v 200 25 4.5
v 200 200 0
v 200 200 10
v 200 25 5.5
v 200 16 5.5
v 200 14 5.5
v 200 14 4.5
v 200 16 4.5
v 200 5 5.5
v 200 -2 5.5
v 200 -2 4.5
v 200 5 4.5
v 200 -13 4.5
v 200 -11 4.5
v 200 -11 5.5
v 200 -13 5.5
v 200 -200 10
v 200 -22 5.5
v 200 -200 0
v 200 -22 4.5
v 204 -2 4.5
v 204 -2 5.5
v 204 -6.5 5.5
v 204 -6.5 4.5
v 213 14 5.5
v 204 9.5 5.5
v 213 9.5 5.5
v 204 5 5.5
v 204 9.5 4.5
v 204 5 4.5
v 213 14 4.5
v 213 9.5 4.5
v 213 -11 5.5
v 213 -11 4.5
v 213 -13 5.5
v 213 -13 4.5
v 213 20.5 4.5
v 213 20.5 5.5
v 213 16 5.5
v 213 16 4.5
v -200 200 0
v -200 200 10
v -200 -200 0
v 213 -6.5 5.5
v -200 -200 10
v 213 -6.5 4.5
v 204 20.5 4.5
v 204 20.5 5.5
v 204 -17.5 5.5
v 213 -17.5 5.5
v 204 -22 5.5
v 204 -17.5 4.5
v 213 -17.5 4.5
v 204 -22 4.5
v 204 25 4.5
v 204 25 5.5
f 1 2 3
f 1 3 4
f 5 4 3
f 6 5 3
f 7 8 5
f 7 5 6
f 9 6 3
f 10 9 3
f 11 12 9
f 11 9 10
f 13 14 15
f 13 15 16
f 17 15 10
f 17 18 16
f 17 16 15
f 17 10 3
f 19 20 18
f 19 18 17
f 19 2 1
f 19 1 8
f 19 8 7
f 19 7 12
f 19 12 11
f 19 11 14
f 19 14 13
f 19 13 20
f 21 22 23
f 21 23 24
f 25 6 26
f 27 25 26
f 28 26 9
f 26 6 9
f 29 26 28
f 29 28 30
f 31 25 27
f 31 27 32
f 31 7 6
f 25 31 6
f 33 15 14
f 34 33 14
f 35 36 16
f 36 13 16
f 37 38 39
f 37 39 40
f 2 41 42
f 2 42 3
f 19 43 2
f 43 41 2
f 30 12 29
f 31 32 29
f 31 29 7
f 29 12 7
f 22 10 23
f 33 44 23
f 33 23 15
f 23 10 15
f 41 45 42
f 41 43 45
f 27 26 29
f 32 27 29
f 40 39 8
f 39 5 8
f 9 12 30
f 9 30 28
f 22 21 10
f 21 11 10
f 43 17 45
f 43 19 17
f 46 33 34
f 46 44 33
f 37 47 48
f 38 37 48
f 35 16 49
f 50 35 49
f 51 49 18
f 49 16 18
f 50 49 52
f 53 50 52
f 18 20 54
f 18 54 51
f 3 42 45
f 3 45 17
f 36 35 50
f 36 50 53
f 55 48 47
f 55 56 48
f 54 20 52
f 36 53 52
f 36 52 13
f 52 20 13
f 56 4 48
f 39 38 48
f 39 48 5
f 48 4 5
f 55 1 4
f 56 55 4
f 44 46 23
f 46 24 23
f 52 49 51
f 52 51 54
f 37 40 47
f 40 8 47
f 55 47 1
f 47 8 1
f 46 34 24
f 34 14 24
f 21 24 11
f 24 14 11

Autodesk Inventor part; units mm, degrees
ref_plane "YZ Plane" through (0, 0, 0) normal (1, 0, 0) x (0, 1, 0)
ref_plane "XZ Plane" through (0, 0, 0) normal (0, 1, 0) x (-1, 0, 0)
ref_plane "XY Plane" through (0, 0, 0) normal (0, 0, 1) x (1, 0, 0)
sketch "Skizze1" plane through (0, 0, 0) normal (0, 0, 1) x (1, 0, 0)
  line L0 (-200, 200) -> (200, 200)
  line L1 (200, 200) -> (200, -200)
  line L2 (200, -200) -> (-200, -200)
  line L3 (-200, -200) -> (-200, 200)
  line L4 (-280, 0) -> (280, 0) projected
  line L5 (0, -280) -> (0, 280) projected
  point P0 (0, 0)
  dimension "d0" = 400
  dimension "d1" = 400
extrude "Extrusion1" add sketch "Skizze1" along normal blind 10
sketch "Skizze2" plane through (200, -200, 0) normal (1, 0, 0) x (0, 0, -1)
  line L0 (0, 400) -> (0, 0) projected
  line L1 (0, 400) -> (-10, 400) projected
  line L2 (-10, 0) -> (-10, 400) projected
  line L3 (0, 0) -> (-10, 0) projected
  line L4 (-5.5, 182.5) -> (-4.5, 182.5)
  line L5 (-4.5, 182.5) -> (-4.5, 193.5)
  line L6 (-4.5, 193.5) -> (-5.5, 193.5)
  line L7 (-5.5, 193.5) -> (-5.5, 182.5)
  line L8 (-5.5, 182.5) -> (-4.5, 182.5)
  line L9 (-4.5, 182.5) -> (-4.5, 187)
  line L10 (-4.5, 187) -> (-5.5, 187)
  line L11 (-5.5, 187) -> (-5.5, 182.5)
  line L12 (-5.5, 189) -> (-4.5, 189)
  line L13 (-4.5, 189) -> (-4.5, 193.5)
  line L14 (-4.5, 193.5) -> (-5.5, 193.5)
  line L15 (-5.5, 193.5) -> (-5.5, 189)
  line L16 (-5.5, 182.5) -> (-4.5, 182.5)
  line L17 (-4.5, 182.5) -> (-4.5, 178)
  line L18 (-4.5, 178) -> (-5.5, 178)
  line L19 (-5.5, 178) -> (-5.5, 182.5)
  line L20 (-5.5, 193.5) -> (-4.5, 193.5)
  line L21 (-4.5, 193.5) -> (-4.5, 198)
  line L22 (-4.5, 198) -> (-5.5, 198)
  line L23 (-5.5, 198) -> (-5.5, 193.5)
  line L24 (-6.1285, 188) -> (-3.7092, 188)
  line L25 (-10, 0) -> (-10, 400) projected
  line L26 (0, 400) -> (0, 0) projected
  point P0 (0, 200)
  dimension "d4" = 20
  dimension "d5" = 1
  dimension "d6" = 11
  dimension "d7" = 2
  dimension "d8" = 4.5
  dimension "d10" = 178
extrude "Extrusion2" add sketch "Skizze2" along normal blind 4 contours L7 L10 L5 L4 | L4 L17 L18 L19 | L7 L6 L5 L12 | L23 L22 L21 L6
extrude "Extrusion4" add sketch "Skizze2" along normal blind 13 contours L7 L10 L5 L4 | L7 L6 L5 L12
pattern_linear "Rechteckige Anordnung1" count 2 spacing 27 along (0, 1, 0) of "Extrusion4", "Extrusion2"
properties part number "PV_Modul_CPY_3_CPY2" material "Glas"
